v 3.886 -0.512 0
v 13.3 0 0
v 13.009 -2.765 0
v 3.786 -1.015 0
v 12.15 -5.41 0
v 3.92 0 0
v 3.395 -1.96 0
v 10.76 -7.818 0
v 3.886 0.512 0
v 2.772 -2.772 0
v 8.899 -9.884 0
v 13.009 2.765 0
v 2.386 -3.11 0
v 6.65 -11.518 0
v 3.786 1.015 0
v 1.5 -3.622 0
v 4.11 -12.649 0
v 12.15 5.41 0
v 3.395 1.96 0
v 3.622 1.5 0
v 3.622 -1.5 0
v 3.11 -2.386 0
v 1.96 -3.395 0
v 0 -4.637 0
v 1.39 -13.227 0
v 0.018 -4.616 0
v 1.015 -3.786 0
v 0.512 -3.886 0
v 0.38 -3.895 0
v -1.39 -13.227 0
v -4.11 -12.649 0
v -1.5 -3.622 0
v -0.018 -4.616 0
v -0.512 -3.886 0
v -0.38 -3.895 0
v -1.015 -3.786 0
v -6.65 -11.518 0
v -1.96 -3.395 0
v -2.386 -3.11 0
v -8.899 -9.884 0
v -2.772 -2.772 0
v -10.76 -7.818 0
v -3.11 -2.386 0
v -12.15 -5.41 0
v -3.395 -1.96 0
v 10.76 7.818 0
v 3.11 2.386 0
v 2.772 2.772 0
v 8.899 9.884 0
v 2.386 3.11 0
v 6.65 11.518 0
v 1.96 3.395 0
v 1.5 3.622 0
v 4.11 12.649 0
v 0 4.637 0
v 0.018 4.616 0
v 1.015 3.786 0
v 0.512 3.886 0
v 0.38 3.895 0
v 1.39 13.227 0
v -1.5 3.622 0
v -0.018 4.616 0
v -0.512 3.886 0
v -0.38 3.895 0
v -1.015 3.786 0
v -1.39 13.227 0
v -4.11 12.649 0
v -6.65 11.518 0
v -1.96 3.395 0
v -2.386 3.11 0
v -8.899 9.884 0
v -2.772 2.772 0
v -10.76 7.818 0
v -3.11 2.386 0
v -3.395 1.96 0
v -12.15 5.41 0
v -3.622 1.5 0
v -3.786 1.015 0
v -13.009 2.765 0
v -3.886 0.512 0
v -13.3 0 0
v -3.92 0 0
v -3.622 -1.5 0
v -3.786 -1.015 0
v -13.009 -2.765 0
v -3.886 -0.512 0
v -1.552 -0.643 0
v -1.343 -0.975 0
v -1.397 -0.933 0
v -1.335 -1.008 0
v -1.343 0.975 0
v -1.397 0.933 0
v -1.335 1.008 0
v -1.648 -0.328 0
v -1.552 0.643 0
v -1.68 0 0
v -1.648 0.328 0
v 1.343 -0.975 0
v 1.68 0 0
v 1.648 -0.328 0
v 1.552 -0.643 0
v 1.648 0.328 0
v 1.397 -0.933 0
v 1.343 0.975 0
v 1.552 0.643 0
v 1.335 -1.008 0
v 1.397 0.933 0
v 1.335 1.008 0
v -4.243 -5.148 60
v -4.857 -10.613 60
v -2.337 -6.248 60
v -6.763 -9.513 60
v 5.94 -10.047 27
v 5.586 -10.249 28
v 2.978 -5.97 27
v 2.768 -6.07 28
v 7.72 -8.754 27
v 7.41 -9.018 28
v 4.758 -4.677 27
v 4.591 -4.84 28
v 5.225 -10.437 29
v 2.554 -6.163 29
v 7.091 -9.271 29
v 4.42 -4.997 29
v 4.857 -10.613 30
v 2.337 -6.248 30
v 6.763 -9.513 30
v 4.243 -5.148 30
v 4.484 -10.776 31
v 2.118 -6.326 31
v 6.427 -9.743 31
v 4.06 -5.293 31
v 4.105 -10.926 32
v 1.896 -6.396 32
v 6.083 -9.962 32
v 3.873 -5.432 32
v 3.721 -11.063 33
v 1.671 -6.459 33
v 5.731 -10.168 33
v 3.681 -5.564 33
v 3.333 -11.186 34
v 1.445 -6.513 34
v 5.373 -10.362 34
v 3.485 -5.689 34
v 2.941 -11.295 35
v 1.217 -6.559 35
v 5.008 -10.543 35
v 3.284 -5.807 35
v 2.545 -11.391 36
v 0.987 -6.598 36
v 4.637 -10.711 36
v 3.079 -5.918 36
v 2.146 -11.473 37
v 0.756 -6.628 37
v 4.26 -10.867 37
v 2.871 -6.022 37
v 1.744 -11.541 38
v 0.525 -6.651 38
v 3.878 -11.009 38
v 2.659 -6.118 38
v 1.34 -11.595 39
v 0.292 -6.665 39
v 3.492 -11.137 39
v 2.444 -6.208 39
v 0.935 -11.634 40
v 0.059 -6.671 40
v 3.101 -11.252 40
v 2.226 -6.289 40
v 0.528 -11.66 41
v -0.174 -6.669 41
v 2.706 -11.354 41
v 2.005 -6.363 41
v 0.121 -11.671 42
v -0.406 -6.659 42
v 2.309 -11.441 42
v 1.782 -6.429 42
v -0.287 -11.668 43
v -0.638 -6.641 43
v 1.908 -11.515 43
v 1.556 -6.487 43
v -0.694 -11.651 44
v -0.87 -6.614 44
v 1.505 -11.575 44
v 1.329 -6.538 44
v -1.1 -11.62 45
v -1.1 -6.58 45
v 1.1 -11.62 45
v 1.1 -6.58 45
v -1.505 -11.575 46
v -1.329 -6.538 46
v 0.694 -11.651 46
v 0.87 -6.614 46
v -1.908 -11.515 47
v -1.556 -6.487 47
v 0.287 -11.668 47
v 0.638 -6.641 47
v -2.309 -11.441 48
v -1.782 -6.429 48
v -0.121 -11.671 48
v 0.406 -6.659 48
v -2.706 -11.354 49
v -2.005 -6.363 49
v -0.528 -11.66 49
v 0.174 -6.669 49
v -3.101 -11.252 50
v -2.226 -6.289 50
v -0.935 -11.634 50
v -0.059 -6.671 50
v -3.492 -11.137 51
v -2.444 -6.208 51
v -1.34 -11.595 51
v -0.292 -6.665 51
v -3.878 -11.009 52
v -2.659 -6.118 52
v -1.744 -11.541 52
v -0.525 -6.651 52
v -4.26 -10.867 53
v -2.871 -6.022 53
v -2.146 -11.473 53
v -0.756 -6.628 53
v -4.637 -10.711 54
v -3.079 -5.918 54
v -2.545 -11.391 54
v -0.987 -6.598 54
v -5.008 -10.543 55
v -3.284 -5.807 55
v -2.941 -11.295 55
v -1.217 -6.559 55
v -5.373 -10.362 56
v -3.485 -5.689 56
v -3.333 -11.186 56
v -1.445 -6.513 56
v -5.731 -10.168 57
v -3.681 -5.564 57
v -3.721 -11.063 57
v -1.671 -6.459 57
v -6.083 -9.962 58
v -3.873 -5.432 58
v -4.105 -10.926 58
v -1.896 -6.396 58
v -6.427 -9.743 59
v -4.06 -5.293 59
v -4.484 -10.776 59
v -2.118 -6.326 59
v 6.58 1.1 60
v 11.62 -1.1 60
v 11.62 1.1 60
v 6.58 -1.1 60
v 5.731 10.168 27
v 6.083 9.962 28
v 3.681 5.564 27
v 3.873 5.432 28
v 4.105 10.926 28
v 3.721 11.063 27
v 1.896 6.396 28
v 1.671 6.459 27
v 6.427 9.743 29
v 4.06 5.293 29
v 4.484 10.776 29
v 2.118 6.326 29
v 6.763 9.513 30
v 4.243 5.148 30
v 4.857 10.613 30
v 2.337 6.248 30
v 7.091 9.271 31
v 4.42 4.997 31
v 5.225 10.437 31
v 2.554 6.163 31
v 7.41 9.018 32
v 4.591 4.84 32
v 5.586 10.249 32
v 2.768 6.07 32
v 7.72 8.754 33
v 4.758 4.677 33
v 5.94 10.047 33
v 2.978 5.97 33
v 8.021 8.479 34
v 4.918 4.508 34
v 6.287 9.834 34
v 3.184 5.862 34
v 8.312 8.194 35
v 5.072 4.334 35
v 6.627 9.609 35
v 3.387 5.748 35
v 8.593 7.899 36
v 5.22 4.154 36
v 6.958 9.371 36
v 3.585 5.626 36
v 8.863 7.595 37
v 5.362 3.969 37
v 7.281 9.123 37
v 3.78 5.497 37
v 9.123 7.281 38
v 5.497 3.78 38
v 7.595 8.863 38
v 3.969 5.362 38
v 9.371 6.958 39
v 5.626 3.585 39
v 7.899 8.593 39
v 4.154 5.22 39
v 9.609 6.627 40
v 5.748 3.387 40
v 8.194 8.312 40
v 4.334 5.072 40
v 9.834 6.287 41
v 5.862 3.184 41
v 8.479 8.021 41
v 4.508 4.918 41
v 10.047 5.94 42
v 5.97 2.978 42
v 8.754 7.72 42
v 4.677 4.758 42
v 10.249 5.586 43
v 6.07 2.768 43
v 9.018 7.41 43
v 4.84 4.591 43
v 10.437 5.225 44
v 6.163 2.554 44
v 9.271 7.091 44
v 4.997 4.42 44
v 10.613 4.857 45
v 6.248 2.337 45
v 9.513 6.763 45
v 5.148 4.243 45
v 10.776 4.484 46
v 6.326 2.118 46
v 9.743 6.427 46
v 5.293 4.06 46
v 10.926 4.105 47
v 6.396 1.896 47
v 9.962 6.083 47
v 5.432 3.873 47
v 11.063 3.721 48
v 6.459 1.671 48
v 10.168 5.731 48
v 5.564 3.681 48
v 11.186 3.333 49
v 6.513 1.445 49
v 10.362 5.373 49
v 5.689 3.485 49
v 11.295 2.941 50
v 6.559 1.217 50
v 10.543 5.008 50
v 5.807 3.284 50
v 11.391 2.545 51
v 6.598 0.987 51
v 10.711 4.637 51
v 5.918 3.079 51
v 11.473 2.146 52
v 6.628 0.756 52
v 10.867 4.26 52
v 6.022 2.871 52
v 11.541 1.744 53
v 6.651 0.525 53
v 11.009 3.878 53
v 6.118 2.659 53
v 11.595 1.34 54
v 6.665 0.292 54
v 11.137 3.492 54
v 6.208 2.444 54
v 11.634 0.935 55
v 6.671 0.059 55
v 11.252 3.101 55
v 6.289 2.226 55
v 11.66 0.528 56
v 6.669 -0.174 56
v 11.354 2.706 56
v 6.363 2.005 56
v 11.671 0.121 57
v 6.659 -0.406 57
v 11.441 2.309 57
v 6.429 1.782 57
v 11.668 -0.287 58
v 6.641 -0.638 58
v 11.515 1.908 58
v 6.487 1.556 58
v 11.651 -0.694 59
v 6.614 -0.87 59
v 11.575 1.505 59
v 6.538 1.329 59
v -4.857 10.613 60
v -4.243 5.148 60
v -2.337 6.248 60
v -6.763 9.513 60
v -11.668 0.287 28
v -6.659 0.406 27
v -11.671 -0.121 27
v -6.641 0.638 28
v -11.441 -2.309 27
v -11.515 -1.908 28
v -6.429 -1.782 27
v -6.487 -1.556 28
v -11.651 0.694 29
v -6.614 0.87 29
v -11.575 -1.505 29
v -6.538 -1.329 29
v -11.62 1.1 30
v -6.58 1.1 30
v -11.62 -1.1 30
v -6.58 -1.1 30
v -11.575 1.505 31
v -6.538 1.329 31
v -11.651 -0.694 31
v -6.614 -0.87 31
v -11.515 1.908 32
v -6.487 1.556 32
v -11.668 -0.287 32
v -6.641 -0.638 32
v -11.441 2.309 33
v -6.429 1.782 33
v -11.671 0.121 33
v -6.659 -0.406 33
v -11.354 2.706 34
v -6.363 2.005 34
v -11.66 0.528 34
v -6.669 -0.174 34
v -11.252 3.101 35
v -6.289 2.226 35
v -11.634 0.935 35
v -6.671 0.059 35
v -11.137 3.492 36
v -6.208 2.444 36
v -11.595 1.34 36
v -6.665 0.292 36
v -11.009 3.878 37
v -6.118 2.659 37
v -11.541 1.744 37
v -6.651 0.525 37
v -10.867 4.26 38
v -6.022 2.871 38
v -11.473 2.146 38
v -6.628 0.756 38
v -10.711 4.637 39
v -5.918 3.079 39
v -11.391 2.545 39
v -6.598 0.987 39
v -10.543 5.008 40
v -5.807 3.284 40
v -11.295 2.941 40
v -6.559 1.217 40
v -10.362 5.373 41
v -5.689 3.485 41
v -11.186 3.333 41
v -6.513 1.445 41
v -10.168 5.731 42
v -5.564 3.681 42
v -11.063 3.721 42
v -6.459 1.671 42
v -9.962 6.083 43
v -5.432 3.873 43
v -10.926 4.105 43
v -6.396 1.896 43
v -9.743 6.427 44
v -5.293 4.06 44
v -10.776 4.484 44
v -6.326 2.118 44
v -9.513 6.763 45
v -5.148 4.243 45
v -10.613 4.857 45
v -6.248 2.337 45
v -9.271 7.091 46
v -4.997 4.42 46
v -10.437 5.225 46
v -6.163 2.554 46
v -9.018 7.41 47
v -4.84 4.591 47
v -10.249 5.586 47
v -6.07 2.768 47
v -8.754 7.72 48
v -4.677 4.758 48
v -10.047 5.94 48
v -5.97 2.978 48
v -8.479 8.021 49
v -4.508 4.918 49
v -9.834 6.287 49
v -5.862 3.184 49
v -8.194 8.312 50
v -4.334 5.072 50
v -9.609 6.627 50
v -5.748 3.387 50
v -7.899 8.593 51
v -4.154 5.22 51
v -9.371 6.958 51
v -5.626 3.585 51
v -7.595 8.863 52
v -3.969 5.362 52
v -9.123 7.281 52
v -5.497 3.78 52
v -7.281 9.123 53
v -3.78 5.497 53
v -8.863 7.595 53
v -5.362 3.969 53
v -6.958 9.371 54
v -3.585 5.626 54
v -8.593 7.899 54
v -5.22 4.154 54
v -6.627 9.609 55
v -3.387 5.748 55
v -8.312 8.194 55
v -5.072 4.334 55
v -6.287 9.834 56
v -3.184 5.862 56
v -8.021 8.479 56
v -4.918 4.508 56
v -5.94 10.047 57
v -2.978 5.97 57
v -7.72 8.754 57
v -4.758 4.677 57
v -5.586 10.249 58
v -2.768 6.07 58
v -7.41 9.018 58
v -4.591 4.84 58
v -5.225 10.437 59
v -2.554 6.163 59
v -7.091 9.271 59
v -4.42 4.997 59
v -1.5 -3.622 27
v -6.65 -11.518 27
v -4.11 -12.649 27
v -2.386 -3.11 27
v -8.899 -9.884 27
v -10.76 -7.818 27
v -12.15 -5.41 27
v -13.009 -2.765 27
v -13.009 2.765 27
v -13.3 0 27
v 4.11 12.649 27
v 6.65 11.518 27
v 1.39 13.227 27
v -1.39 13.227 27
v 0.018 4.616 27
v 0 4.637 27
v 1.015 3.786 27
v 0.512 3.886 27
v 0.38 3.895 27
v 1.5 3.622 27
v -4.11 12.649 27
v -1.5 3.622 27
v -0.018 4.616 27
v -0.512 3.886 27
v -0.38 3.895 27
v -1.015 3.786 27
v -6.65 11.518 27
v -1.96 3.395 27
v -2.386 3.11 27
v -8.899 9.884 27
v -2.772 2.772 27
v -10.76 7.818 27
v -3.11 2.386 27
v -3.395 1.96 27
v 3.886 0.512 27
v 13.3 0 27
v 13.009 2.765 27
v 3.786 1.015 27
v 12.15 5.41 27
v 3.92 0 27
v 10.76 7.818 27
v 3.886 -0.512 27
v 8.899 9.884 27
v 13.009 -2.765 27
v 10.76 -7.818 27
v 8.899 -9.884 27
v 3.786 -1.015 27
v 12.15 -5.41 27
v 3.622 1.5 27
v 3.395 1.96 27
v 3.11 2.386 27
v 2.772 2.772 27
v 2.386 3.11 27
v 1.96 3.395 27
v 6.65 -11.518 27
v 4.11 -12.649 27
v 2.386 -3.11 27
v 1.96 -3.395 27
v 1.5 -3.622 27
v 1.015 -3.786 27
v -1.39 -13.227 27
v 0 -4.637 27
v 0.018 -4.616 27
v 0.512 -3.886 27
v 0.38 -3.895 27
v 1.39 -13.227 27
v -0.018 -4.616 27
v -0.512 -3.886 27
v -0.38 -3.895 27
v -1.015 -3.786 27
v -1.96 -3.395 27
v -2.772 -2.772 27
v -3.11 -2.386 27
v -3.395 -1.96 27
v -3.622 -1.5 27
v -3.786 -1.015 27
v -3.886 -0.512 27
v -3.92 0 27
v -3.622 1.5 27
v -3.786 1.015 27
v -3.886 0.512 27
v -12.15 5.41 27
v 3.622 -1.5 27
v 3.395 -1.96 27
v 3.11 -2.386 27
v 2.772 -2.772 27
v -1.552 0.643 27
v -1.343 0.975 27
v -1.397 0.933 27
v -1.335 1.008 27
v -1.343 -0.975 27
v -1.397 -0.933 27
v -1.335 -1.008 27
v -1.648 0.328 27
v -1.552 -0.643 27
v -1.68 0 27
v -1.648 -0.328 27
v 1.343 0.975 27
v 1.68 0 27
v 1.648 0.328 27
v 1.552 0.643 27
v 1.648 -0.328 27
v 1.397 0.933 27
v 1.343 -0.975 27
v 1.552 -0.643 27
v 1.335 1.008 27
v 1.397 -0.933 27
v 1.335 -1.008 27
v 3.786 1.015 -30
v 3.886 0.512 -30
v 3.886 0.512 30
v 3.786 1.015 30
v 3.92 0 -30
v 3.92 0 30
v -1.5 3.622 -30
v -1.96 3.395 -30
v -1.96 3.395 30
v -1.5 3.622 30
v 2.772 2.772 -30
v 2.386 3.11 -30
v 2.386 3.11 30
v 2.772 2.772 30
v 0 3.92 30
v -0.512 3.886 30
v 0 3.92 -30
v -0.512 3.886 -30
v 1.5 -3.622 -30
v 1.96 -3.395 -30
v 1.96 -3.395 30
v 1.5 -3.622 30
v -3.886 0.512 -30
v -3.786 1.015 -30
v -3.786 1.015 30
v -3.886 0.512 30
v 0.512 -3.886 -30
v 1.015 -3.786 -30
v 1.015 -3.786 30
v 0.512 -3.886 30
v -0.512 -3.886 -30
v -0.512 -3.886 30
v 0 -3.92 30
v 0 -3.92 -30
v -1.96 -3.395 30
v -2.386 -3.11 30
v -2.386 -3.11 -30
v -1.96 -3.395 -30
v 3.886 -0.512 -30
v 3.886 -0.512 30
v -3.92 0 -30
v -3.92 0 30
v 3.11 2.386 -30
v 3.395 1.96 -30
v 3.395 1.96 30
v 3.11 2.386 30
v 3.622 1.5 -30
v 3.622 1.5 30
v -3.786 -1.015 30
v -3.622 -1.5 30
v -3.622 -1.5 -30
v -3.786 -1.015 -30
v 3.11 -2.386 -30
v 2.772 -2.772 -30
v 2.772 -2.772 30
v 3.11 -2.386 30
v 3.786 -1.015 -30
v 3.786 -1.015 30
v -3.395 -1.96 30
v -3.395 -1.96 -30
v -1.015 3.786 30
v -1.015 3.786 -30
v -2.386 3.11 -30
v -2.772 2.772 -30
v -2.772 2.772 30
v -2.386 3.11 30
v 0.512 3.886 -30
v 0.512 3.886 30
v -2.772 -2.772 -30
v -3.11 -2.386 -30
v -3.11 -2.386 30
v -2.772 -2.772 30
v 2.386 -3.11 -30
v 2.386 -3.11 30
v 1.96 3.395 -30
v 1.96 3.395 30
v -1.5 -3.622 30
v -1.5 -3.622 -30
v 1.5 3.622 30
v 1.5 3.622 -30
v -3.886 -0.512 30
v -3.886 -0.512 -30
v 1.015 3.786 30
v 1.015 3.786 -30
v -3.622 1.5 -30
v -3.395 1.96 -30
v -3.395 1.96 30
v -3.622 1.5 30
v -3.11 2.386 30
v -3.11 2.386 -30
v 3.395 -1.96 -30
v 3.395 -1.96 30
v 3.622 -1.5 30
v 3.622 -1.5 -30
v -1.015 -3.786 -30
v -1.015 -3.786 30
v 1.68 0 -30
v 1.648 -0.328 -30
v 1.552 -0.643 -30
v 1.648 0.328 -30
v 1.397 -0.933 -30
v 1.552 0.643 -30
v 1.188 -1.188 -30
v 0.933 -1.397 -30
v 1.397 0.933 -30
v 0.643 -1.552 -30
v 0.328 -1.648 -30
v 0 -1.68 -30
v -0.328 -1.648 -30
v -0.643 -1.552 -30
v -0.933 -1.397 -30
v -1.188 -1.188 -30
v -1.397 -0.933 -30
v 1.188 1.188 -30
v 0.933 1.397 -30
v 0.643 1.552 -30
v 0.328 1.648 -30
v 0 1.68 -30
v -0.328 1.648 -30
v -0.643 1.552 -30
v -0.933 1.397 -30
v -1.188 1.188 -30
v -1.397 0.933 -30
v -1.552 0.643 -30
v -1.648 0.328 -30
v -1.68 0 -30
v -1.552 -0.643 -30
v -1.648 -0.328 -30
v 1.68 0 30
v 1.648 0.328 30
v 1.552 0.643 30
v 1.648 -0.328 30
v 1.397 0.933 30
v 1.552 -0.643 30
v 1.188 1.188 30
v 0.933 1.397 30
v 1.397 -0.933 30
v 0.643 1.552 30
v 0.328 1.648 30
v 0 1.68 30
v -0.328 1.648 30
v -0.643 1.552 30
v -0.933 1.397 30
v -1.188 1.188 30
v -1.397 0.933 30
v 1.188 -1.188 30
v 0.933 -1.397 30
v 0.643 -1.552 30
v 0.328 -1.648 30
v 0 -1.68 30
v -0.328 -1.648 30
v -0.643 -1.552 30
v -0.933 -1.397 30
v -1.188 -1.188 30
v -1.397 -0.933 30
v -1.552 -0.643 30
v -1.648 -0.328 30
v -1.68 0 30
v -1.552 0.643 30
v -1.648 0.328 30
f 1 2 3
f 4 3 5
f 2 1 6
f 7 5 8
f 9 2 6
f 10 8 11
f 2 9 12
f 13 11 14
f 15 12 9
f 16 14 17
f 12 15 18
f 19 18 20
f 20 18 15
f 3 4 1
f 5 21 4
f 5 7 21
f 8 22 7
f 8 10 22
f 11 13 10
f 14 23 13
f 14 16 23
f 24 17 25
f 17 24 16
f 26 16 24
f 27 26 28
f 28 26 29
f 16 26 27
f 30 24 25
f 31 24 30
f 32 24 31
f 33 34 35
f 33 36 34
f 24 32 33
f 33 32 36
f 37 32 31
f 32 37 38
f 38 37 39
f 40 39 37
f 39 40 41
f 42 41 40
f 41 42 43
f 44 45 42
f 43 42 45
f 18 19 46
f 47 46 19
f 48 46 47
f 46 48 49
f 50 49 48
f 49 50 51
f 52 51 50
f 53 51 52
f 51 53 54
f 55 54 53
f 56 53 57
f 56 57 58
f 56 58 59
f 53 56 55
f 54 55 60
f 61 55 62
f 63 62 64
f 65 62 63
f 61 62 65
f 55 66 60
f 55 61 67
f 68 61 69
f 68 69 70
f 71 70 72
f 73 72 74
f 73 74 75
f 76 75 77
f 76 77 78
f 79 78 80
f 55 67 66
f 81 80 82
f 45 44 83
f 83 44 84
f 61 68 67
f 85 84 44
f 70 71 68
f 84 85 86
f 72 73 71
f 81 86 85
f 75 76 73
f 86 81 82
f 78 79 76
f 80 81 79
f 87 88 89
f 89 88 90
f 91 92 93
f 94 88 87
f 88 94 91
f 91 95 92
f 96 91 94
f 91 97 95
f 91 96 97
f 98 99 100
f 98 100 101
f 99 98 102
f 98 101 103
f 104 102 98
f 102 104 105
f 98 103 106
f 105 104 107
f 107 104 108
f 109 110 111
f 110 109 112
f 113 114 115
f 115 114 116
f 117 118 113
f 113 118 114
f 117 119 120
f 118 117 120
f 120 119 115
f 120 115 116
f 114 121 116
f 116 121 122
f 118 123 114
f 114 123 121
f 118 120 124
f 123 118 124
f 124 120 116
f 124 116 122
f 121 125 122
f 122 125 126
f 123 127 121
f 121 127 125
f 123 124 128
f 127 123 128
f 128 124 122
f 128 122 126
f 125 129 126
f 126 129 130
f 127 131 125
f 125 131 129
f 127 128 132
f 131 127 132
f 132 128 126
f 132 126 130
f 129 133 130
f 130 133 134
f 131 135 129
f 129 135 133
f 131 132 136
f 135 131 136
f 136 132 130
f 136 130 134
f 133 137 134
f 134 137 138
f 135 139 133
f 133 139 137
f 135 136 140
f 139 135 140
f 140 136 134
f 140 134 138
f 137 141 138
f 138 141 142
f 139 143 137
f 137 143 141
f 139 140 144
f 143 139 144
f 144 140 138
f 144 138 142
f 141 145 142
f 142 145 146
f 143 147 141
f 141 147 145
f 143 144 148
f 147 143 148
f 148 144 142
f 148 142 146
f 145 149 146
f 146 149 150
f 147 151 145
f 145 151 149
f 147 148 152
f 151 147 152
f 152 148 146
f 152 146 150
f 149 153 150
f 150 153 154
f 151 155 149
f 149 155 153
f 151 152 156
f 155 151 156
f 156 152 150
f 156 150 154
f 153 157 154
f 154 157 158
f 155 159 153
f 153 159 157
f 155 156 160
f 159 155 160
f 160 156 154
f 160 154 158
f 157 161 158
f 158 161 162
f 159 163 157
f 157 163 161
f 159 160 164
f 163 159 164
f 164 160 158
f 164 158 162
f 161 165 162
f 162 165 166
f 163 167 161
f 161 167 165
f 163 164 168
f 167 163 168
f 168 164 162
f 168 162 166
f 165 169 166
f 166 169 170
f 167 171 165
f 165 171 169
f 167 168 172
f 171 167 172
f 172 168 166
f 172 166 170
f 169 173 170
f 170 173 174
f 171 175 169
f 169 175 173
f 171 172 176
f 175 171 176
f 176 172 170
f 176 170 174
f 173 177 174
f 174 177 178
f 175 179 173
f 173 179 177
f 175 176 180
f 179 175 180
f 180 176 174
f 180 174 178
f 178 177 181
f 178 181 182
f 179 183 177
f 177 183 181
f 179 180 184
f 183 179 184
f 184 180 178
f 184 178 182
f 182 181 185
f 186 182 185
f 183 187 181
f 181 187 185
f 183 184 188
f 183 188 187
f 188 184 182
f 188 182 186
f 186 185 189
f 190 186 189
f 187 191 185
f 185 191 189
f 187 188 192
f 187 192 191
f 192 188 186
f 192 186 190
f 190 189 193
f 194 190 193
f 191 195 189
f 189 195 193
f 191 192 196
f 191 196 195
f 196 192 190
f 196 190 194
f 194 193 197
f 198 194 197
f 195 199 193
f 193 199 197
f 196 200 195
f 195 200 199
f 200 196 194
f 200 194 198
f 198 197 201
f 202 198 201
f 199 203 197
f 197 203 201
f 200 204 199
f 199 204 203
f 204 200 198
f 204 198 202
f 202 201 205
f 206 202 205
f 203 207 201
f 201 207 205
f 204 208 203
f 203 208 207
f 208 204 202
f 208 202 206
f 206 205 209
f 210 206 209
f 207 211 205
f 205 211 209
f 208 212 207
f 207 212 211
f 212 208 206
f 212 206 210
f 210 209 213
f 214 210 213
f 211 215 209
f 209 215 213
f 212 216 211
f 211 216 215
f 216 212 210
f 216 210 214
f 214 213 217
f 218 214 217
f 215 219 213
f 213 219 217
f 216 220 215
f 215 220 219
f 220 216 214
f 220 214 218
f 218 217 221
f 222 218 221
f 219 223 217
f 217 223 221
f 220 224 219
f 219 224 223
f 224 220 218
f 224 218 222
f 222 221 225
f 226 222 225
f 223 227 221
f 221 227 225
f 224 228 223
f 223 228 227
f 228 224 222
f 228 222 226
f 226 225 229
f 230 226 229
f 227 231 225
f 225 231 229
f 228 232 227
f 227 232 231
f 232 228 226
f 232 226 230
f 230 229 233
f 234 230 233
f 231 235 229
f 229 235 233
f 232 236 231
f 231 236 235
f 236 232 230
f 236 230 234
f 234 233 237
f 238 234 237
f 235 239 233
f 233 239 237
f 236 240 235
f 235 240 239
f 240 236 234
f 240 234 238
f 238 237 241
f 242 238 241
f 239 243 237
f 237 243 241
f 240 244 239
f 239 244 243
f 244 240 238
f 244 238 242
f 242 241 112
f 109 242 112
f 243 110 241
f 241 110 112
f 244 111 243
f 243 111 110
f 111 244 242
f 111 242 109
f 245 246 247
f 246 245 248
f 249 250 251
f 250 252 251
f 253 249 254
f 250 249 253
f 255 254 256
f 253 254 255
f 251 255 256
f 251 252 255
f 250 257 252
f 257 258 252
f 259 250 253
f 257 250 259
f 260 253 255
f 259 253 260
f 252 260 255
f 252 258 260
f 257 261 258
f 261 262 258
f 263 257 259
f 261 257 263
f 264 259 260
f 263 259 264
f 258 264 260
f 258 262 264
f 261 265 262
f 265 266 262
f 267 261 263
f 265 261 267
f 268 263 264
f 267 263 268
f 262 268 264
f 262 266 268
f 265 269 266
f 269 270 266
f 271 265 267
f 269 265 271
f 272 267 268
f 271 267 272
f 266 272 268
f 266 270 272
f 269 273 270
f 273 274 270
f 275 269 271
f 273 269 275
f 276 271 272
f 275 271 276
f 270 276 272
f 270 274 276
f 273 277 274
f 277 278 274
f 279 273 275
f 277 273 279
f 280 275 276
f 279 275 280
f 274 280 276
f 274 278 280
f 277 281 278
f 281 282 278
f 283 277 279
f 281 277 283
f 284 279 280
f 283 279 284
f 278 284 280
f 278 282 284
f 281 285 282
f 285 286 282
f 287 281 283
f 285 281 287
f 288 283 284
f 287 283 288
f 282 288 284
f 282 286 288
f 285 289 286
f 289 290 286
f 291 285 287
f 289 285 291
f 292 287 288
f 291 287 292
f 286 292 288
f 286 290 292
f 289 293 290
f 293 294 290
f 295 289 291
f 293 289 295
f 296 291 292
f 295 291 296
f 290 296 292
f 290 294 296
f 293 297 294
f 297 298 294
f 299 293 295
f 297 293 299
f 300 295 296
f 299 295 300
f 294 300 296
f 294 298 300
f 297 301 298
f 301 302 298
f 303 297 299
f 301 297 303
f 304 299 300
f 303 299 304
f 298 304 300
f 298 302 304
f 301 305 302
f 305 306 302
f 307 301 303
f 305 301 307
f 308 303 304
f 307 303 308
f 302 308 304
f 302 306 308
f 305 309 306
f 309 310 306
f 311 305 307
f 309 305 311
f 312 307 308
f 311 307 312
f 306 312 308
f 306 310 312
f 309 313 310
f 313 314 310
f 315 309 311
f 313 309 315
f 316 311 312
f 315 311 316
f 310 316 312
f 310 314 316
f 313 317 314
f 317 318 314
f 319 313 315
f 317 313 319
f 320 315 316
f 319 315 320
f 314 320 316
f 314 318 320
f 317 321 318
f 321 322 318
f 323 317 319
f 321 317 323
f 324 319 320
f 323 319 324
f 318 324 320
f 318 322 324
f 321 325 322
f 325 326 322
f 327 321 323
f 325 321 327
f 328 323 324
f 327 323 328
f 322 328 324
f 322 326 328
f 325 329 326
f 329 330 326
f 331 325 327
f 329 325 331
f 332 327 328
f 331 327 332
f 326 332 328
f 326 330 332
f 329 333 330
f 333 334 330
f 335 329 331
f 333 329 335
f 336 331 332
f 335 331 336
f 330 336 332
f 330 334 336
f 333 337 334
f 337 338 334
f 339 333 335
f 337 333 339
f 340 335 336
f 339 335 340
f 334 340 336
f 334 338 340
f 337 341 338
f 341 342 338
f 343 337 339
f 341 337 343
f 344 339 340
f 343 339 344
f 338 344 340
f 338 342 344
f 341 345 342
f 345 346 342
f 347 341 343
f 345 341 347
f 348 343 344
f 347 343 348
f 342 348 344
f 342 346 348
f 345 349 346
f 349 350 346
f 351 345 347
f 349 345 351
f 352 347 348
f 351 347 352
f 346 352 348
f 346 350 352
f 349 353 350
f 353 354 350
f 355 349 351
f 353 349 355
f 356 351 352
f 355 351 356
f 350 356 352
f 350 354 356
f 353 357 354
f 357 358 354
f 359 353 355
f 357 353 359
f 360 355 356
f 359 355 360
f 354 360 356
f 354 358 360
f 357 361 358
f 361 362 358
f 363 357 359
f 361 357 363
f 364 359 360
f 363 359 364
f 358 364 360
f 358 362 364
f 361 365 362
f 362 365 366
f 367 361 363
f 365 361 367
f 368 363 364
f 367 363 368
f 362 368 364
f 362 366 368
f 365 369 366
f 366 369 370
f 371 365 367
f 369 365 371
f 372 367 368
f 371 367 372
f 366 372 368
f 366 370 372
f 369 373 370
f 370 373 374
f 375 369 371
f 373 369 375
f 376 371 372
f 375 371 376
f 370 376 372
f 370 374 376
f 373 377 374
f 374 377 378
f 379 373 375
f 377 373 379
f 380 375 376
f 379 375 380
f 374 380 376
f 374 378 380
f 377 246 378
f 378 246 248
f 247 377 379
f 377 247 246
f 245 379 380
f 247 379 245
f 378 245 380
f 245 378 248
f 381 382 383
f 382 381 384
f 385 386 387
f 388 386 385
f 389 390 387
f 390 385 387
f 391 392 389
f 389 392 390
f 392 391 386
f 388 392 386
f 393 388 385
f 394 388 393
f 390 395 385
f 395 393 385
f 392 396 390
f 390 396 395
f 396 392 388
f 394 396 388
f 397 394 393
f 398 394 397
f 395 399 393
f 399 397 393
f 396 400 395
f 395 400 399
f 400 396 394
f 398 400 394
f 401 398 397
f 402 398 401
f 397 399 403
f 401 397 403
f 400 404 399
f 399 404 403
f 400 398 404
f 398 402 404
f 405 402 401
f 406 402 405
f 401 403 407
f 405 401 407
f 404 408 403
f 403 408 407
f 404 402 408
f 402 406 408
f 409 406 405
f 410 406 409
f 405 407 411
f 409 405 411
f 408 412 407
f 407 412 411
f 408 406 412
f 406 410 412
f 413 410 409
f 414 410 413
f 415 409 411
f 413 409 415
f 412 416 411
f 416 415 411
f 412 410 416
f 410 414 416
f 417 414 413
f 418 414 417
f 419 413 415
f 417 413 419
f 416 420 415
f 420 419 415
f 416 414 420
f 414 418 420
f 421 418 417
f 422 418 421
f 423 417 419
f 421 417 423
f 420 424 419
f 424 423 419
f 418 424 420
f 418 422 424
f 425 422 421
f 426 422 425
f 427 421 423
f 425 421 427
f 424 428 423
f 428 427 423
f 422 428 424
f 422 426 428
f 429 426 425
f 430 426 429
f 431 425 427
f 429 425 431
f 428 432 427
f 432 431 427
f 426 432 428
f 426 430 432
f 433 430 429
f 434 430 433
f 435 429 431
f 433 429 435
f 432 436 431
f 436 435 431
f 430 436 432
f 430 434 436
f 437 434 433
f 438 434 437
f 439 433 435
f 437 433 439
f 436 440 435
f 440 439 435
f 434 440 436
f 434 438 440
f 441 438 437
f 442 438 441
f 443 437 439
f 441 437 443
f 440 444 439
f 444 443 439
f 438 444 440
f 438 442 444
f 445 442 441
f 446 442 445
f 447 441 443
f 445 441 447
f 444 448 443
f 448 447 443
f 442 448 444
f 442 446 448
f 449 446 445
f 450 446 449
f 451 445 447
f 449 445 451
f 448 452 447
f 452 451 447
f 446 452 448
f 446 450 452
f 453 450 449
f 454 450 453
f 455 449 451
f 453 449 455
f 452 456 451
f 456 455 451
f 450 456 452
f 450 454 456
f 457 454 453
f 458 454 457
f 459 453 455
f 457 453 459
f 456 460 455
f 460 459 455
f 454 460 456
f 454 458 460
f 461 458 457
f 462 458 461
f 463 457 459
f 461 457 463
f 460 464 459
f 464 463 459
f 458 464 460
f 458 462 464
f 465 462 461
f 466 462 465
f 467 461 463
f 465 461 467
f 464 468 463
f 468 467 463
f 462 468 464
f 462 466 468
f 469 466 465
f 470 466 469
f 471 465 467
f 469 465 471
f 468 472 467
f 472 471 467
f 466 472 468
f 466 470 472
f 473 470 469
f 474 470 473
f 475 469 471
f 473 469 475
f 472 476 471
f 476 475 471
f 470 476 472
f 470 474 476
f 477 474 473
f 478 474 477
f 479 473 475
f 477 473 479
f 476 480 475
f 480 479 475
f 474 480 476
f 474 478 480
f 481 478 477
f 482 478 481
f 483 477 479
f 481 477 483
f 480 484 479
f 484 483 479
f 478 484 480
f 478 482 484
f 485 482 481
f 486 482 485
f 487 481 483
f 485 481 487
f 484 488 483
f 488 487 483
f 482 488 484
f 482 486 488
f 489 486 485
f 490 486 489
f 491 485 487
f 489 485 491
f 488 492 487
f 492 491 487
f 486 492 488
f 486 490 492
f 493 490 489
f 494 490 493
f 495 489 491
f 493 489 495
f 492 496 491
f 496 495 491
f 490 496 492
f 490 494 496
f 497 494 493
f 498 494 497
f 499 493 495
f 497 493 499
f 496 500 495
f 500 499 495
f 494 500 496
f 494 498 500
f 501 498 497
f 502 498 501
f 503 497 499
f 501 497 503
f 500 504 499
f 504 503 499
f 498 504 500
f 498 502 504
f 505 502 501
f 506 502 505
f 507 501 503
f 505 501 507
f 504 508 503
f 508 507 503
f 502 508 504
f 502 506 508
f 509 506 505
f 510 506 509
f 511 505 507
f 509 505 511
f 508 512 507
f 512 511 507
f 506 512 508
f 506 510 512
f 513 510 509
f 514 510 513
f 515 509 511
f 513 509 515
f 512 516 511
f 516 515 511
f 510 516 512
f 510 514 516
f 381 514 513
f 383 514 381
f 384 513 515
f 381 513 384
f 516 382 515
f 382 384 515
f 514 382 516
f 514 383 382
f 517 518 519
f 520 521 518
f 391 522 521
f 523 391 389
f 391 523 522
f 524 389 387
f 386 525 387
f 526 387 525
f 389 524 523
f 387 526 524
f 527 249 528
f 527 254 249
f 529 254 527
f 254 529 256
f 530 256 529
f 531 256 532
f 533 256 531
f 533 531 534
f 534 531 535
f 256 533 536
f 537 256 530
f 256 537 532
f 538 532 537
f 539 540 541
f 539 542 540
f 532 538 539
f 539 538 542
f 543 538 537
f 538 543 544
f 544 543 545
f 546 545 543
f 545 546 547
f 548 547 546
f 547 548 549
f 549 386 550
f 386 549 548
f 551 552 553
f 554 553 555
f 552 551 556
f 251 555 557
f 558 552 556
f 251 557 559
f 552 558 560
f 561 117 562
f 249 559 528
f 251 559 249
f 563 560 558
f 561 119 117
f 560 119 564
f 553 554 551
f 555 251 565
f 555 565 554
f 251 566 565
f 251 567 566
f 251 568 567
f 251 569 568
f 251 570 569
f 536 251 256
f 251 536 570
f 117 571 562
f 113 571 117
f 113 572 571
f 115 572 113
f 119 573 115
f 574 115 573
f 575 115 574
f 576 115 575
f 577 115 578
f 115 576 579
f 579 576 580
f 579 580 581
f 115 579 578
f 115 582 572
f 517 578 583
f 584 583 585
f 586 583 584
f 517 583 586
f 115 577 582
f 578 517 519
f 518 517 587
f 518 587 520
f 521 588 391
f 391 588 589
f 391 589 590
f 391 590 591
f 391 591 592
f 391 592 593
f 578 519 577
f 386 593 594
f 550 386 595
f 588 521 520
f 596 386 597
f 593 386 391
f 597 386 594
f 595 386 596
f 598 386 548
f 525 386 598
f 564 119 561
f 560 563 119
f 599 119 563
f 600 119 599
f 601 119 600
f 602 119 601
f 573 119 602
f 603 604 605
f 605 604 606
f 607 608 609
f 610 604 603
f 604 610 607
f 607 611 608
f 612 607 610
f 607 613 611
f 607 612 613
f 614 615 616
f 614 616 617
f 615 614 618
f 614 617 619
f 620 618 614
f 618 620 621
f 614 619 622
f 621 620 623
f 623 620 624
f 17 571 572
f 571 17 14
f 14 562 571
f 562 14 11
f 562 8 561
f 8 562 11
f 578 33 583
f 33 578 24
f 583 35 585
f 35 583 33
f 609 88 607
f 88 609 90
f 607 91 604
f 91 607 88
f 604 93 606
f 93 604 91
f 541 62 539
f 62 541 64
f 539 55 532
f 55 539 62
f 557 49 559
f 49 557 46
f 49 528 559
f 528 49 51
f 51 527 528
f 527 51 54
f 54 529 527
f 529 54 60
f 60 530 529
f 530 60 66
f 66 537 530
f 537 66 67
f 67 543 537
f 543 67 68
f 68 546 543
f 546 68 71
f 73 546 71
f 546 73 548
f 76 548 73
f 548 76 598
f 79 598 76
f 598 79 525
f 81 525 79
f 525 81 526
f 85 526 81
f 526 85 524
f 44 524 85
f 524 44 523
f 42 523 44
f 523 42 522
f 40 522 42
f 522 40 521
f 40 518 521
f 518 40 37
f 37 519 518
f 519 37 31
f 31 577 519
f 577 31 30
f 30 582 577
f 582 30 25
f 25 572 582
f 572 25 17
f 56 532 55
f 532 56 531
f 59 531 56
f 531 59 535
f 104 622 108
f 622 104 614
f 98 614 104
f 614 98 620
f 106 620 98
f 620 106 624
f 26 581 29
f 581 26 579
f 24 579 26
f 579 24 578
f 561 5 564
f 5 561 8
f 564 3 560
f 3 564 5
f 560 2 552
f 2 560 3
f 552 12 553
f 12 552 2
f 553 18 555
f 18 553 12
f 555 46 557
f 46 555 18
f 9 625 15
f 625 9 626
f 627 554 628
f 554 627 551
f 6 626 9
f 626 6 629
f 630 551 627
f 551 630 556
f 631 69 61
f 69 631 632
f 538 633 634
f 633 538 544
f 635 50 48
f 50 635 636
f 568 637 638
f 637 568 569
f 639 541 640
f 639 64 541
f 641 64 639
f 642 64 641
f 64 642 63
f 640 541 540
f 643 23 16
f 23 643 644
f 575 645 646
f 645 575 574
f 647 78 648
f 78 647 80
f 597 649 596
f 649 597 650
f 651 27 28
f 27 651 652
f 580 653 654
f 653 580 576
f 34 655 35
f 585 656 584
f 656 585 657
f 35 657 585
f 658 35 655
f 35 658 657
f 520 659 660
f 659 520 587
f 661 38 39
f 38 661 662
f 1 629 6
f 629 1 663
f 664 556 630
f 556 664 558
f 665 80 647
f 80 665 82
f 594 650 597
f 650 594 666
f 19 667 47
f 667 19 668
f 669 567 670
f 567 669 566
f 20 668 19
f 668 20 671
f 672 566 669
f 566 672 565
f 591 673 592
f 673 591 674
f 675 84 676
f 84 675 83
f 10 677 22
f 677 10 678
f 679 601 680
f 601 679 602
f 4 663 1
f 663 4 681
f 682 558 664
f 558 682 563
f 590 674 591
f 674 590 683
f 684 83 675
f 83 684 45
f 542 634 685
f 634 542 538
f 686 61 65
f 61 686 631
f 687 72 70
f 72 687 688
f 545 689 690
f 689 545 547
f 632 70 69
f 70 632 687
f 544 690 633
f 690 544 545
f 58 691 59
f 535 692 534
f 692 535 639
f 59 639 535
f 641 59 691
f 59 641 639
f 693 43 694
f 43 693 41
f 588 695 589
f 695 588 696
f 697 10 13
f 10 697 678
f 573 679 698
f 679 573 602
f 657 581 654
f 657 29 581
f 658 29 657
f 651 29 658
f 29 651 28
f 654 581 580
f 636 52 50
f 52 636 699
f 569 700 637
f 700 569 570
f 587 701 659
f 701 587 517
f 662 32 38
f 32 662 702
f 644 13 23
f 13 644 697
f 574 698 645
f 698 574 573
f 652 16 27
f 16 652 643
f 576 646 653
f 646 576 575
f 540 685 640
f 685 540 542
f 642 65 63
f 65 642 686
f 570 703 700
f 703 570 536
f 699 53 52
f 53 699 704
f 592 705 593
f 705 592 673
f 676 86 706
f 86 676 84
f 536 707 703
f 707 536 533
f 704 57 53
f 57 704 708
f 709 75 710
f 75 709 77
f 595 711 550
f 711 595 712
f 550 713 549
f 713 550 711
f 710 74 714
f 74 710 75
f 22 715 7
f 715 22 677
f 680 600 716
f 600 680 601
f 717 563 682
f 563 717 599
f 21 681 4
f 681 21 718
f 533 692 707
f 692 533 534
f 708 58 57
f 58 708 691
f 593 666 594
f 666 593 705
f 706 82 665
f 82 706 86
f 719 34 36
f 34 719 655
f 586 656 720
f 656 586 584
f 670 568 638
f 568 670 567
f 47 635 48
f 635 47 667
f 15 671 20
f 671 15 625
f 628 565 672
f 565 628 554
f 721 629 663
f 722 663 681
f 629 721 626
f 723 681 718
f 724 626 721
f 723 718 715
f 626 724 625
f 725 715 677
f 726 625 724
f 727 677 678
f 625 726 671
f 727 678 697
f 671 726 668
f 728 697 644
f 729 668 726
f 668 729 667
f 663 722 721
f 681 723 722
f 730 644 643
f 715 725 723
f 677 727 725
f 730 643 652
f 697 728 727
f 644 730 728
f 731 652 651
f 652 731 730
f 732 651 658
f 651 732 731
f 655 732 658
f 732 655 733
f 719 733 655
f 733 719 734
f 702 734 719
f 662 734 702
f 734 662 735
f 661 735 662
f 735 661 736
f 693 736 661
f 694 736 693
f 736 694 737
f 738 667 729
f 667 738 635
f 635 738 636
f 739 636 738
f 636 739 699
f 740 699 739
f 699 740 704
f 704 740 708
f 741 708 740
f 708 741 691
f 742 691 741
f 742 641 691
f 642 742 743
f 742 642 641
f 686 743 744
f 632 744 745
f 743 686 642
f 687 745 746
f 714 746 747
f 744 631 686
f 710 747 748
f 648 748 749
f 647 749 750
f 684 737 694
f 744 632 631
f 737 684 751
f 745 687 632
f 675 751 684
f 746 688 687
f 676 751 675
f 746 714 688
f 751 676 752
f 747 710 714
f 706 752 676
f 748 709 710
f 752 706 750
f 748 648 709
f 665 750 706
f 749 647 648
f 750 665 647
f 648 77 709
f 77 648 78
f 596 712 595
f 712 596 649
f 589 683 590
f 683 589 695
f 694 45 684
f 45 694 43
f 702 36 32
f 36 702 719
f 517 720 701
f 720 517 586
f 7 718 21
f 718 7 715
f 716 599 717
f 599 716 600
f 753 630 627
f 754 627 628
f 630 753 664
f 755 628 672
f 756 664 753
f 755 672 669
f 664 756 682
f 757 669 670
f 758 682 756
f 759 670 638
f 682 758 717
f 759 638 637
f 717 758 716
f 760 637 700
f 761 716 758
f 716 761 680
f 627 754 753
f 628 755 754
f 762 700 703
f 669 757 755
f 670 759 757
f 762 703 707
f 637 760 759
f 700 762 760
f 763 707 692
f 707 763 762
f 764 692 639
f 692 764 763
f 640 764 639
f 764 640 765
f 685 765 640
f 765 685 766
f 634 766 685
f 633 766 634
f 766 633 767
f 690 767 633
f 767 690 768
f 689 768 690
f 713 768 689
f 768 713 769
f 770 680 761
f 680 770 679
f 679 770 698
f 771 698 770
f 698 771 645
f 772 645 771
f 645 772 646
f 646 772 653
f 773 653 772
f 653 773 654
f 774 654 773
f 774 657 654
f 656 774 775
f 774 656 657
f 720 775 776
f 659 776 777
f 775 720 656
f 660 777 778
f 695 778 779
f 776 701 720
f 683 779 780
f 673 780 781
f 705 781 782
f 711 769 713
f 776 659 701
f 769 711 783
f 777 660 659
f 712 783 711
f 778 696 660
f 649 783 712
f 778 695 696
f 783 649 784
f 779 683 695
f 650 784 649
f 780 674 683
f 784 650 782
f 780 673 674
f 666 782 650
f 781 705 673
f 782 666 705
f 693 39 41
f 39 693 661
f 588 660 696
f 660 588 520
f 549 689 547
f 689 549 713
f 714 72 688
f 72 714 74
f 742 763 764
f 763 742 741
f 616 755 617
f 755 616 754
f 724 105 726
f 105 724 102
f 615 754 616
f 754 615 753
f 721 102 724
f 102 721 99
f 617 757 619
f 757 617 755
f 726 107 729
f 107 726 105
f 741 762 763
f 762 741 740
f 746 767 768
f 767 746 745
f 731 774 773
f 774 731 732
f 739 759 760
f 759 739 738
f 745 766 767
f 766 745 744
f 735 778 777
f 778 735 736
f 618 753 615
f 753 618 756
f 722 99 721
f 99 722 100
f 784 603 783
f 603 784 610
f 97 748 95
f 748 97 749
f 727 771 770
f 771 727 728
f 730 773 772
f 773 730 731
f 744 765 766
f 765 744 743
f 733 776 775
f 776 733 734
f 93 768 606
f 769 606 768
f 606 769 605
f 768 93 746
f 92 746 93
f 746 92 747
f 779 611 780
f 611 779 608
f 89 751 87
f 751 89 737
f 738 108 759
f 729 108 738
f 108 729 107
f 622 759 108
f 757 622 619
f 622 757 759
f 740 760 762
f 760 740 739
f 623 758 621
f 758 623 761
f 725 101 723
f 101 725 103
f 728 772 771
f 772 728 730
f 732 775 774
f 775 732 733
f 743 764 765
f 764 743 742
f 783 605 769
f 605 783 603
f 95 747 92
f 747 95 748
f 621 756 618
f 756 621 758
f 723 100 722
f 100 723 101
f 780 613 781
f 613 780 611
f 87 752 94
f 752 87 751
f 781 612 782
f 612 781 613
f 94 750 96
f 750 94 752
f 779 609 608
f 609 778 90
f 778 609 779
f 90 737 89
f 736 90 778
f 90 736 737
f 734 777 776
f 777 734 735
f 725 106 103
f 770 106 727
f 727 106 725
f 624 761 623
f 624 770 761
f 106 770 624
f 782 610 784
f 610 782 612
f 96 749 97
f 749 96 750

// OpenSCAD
/*
 * HVAT_BLADES.scad
 * Hybrid Vertical Axis Turbine (HVAT) rotor blades
 * Savonius drag scoops (bottom, for starting torque) + Helical Darrius (lift, smooth running)
 * Used as active flow straightener / mixer in the central exhaust of the HDD platter stack.
 *
 * Print separately and mount on central shaft (3-5 mm carbon fiber or steel) with bearings.
 * Designed for low-friction free rotation or light braking.
 *
 * From the May 2026 Grok design conversation.
 */

module hybrid_hvat(height=60, dia=28, savonius_overlap=0.7, twist=180) {
    // Helical Darrius (lift blades) — 3 blades, helical twist
    for (i = [0:2]) {
        rotate([0, 0, i*120]) {
            linear_extrude(height=height, twist=twist, slices=60)
                translate([dia/2 * 0.65, 0, 0])
                    square([dia*0.18, 2.2], center=true);  // thin airfoil approx
        }
    }

    // Savonius drag scoops at bottom for self-starting torque
    for (i = [0:1]) {
        rotate([0, 0, i*180]) {
            linear_extrude(height=height*0.45, twist=0)
                difference() {
                    circle(d=dia*0.95);
                    translate([dia*0.25, 0, 0]) circle(d=dia*0.6);
                }
        }
    }

    // Central hub (hollow for shaft)
    difference() {
        cylinder(d=dia*0.28, h=height, center=true, $fn=48);
        cylinder(d=dia*0.12, h=height+1, center=true, $fn=32);
    }
}

// Usage example — render and export STL
hybrid_hvat(height=60, dia=28, twist=120);  // adjust twist for pitch
